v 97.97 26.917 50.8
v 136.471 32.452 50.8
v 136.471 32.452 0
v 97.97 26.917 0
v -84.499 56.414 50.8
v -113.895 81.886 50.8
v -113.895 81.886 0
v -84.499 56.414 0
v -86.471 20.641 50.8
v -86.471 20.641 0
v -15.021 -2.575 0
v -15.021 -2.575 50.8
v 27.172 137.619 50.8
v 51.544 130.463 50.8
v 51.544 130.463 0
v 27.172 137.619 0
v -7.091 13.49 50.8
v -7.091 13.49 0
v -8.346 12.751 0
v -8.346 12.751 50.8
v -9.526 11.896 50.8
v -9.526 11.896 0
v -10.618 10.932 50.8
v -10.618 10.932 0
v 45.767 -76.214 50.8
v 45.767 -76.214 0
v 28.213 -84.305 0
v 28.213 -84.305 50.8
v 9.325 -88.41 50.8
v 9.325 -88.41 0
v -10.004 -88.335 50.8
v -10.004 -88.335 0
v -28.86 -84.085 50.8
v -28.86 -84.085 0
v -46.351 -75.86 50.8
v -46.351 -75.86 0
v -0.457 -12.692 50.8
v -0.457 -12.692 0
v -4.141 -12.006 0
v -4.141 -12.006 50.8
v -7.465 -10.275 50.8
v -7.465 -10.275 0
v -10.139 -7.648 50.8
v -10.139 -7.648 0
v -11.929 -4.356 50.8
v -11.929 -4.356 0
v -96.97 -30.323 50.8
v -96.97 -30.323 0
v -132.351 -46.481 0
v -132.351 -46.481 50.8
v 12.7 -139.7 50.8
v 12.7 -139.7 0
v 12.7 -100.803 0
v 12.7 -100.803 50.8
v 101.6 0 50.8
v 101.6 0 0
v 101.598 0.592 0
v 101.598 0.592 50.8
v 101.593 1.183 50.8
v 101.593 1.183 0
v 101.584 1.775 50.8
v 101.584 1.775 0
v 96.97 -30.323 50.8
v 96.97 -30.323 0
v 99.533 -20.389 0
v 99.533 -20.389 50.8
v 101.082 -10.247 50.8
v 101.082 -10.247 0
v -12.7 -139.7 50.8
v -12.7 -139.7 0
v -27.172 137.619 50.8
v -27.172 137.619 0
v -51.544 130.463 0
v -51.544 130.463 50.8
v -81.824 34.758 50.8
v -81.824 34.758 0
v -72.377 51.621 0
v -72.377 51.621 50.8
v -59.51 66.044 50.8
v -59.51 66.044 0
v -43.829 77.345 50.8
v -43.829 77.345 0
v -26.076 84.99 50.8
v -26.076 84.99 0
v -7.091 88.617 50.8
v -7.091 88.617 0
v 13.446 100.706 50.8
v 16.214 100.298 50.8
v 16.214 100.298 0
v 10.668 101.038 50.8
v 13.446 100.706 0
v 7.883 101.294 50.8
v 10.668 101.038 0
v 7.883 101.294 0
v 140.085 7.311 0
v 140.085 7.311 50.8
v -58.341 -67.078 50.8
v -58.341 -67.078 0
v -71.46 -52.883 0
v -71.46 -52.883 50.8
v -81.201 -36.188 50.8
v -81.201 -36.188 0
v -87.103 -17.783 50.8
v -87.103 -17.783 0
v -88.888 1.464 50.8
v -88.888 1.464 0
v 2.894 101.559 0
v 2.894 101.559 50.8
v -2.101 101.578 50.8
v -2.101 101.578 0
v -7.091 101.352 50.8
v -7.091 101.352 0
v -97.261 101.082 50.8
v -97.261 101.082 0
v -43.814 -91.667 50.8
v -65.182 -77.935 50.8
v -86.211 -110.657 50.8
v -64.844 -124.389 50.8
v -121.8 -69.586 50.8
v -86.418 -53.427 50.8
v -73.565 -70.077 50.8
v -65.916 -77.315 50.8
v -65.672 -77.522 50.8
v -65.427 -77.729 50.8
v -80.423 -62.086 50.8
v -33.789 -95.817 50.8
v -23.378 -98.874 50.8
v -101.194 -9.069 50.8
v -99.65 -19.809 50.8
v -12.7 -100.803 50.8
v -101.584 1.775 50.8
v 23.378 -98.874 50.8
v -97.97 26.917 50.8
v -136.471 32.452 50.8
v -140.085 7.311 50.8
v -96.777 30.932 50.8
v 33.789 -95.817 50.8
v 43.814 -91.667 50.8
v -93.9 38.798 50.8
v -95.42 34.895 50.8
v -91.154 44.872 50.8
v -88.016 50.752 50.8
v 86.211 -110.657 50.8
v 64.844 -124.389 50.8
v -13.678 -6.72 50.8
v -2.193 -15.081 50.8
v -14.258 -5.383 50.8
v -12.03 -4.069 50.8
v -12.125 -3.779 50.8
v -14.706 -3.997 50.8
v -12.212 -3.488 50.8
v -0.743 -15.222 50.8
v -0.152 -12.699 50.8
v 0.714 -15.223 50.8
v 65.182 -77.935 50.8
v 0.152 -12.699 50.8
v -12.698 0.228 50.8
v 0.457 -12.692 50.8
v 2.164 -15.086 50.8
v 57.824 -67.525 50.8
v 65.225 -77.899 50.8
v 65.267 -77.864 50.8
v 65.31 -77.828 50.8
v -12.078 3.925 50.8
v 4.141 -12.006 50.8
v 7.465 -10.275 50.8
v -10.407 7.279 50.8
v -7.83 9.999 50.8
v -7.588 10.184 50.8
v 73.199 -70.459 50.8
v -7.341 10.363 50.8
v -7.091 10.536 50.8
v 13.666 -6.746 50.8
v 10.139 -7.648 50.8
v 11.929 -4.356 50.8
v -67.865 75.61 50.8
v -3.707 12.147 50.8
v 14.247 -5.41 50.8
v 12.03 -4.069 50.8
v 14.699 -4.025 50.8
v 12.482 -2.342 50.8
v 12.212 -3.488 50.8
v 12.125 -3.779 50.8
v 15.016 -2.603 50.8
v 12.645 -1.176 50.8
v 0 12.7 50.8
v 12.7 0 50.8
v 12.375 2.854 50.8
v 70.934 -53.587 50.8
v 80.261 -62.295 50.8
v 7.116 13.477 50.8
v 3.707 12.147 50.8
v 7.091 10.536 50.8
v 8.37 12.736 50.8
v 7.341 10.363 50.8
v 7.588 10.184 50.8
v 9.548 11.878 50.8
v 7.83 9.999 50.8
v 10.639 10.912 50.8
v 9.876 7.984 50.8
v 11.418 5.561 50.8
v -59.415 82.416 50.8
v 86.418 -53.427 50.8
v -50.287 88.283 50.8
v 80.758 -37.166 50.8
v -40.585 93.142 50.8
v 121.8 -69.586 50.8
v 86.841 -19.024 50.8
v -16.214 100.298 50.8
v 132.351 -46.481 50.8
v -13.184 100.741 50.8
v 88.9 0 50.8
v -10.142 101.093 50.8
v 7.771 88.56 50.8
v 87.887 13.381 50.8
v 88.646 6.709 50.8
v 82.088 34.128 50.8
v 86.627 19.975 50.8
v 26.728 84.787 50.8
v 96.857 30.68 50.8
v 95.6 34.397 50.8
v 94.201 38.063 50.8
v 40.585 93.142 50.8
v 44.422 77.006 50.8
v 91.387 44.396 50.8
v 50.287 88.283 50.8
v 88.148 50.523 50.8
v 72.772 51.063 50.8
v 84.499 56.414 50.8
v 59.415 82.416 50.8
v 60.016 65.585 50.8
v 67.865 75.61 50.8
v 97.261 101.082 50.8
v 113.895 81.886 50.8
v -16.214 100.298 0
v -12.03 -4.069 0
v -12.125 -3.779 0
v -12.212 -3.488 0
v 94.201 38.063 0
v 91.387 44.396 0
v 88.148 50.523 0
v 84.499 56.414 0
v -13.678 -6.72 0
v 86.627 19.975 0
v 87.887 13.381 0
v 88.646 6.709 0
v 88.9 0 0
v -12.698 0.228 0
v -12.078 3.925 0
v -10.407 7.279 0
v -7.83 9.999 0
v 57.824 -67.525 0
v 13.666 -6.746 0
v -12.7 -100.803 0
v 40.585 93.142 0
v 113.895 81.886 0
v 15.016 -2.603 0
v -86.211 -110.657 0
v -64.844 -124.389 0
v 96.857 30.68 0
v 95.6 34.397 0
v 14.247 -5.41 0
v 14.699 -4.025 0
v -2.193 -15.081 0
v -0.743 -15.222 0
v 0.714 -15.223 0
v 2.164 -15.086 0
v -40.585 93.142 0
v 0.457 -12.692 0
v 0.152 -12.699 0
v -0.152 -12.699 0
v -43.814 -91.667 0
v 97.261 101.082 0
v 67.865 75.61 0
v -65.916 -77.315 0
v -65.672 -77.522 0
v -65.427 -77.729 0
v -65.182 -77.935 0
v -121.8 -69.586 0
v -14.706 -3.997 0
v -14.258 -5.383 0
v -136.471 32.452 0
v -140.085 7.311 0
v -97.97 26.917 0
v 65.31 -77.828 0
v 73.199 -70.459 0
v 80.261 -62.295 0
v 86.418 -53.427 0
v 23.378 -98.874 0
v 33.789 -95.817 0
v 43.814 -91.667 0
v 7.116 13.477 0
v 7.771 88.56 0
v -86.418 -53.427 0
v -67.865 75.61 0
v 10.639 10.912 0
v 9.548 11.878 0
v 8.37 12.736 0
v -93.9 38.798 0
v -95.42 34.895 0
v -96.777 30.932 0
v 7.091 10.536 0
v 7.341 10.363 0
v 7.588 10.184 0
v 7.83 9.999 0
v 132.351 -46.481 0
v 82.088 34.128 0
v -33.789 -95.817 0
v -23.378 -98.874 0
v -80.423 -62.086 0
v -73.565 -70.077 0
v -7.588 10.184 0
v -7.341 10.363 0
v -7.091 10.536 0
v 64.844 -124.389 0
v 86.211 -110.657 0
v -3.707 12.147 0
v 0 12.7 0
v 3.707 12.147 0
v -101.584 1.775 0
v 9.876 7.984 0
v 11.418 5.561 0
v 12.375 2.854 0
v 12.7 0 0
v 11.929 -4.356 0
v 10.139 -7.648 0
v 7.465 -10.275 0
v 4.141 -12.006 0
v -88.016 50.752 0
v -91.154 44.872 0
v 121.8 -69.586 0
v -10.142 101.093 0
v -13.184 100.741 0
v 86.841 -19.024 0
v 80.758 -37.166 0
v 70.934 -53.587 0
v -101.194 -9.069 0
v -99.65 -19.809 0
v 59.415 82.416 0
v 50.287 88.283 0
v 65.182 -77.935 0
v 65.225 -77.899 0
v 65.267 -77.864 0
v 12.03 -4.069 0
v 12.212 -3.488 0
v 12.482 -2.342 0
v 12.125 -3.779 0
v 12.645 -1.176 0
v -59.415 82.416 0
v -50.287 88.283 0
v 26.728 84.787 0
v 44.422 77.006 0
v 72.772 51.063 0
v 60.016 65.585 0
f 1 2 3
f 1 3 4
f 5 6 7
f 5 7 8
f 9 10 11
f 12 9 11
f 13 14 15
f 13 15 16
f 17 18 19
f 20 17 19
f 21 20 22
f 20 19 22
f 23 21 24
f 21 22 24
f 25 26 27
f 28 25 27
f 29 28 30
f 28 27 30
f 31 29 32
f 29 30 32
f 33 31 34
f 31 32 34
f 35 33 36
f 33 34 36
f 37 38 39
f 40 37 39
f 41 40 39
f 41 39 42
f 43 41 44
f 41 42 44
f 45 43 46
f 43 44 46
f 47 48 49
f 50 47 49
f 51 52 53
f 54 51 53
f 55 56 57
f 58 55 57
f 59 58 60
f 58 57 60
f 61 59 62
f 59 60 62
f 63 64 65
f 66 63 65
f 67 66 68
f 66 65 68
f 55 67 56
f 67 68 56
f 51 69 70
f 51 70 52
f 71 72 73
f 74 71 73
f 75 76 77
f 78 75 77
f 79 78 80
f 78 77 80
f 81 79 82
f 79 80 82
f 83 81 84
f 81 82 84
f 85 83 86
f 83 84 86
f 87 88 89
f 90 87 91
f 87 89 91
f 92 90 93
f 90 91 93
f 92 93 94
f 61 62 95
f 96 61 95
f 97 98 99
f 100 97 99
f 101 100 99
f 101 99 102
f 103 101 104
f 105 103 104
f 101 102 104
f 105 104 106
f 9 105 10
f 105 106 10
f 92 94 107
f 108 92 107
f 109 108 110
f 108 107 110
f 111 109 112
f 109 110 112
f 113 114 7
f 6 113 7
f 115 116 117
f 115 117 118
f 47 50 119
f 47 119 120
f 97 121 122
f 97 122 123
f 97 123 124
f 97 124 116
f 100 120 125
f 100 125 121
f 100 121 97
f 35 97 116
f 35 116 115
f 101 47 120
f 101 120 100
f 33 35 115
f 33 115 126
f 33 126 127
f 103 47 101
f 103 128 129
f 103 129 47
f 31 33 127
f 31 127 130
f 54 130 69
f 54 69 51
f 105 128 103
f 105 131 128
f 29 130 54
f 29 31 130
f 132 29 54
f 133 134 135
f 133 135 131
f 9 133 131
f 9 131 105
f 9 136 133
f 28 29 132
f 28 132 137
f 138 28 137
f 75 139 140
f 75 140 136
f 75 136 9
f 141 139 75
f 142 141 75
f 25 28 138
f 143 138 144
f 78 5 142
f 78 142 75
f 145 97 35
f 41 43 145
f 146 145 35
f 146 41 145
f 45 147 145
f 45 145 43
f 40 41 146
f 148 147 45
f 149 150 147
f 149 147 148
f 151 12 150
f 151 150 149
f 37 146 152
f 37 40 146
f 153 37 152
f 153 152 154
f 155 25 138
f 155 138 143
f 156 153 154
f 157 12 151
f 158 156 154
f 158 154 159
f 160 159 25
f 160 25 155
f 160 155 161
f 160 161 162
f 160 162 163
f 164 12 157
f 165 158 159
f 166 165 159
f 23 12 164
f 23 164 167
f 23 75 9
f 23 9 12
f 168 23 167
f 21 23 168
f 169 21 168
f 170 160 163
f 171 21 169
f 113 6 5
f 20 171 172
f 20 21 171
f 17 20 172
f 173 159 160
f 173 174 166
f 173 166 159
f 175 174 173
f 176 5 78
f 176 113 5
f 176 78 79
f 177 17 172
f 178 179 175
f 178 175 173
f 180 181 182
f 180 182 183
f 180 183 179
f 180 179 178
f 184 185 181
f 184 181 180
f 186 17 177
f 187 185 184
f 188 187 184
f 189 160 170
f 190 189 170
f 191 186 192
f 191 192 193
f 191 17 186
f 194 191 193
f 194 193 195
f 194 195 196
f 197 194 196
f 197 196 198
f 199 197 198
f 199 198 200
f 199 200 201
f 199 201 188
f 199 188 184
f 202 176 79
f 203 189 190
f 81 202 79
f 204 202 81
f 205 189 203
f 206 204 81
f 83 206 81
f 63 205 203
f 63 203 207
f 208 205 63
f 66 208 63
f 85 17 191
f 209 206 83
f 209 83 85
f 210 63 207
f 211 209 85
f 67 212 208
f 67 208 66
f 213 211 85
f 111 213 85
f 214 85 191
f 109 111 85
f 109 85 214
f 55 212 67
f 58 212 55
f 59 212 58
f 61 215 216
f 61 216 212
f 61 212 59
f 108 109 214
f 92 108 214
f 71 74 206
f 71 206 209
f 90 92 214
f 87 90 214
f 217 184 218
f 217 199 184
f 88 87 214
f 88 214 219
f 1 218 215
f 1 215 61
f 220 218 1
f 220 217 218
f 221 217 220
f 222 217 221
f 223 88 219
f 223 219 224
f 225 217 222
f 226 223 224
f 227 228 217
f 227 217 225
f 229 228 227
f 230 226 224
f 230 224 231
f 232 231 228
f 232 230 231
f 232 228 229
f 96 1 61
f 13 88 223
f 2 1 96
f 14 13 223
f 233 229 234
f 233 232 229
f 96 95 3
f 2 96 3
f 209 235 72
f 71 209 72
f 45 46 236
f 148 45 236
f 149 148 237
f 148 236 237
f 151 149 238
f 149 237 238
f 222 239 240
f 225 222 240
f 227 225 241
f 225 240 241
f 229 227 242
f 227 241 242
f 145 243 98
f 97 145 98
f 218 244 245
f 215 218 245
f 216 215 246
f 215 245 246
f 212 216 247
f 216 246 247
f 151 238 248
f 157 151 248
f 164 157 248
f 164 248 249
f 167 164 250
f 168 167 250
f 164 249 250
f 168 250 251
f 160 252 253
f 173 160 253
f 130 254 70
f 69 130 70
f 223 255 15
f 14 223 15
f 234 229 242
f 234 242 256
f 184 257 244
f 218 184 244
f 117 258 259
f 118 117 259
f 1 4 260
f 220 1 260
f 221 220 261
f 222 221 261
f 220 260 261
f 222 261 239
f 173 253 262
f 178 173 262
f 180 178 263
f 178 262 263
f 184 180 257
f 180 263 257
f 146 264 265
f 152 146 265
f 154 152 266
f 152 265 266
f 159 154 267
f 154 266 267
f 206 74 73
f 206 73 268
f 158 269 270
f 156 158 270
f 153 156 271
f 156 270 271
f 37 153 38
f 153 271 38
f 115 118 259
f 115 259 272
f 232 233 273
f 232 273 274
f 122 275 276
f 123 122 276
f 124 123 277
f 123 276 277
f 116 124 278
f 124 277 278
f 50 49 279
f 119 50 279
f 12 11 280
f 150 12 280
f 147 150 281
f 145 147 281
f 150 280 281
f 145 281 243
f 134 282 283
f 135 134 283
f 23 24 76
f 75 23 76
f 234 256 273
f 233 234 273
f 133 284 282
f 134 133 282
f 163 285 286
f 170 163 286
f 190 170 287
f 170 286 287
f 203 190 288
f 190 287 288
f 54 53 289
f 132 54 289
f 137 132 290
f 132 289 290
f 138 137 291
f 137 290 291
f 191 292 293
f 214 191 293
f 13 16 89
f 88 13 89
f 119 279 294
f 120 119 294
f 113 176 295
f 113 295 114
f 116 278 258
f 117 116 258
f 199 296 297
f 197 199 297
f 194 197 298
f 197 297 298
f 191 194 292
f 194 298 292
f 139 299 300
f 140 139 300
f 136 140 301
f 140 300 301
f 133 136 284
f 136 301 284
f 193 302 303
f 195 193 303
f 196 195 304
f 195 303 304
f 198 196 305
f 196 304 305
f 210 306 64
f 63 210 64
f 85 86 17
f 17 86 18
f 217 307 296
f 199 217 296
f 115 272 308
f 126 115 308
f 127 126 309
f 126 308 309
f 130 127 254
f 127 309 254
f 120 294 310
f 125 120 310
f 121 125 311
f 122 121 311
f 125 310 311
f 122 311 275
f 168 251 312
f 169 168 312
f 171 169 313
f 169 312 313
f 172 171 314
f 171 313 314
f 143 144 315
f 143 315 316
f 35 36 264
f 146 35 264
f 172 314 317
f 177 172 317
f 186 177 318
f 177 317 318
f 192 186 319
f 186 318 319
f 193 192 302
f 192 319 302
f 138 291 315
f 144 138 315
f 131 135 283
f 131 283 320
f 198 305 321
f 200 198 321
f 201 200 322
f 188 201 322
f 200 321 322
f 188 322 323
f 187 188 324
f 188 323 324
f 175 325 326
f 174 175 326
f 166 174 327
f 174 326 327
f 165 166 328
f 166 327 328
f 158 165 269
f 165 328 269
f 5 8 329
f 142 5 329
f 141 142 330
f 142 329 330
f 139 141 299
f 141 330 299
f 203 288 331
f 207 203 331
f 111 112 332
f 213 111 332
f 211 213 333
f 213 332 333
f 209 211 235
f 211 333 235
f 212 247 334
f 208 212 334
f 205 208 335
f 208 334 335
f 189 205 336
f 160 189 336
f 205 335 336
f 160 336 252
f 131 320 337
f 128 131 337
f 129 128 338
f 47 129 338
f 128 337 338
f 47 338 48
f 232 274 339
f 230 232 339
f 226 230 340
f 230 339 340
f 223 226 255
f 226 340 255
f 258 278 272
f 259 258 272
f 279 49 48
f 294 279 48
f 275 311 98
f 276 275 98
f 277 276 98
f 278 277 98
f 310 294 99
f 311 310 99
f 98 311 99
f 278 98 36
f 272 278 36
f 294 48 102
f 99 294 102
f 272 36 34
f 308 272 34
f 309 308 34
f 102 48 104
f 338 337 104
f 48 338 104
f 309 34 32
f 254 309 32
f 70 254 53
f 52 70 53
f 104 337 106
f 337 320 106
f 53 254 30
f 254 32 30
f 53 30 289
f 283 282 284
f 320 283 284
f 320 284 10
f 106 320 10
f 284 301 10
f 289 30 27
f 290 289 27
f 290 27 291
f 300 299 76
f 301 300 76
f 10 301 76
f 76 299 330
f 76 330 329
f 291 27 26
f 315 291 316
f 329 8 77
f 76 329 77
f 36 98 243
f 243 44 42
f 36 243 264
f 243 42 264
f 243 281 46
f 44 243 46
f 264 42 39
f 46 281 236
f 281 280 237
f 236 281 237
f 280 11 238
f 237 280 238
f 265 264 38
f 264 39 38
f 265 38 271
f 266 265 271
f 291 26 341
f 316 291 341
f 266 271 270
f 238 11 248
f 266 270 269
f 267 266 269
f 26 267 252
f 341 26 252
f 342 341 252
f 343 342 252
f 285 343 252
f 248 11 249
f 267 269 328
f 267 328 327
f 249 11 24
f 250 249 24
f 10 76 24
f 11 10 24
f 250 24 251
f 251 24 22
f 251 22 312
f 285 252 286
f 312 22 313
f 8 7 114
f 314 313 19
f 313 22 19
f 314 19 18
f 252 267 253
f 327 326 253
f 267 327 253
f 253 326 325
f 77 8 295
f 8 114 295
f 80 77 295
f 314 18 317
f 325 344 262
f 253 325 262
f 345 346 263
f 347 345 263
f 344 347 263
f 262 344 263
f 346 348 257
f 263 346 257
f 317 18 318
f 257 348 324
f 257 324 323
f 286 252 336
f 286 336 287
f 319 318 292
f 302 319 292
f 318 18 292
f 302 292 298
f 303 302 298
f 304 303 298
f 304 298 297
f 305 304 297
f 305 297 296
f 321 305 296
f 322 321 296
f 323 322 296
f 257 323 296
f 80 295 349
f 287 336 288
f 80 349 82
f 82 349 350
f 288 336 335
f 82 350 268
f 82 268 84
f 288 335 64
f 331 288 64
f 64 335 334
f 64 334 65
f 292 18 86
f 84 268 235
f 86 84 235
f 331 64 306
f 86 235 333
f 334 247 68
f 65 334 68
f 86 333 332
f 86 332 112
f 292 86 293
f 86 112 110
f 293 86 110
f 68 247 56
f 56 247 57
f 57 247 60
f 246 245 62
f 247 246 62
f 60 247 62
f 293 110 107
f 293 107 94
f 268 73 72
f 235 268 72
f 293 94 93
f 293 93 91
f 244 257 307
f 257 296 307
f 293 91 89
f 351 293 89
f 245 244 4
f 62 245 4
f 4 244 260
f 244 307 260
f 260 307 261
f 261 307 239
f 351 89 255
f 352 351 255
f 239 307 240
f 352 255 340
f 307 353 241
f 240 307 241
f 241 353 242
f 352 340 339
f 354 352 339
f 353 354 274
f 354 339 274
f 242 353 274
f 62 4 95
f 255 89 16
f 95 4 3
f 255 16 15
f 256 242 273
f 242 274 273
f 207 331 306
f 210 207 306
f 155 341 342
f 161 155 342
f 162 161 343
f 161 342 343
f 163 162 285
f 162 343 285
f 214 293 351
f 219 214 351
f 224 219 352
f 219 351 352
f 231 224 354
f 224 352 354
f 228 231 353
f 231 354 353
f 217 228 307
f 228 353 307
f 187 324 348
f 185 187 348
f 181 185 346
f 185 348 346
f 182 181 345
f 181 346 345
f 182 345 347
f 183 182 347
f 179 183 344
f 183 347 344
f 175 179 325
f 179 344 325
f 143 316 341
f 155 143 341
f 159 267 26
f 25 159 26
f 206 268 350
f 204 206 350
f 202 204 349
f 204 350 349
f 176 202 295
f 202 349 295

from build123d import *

# Parameters (mm, degrees)
F1_DEPTH = 50.8


with BuildPart() as f1:
    # F0 (on Top) → F1 (new body)
    with BuildSketch(Plane.XY):
        with BuildLine():
            ThreePointArc((96.9695183528, -30.3228051214), (100.4357084523, -15.3371597005), (101.6, 0))
            ThreePointArc((101.6, 0), (101.596123159, 0.8875579239), (101.5844929317, 1.775048113))
            ThreePointArc((101.5844929317, 1.775048113), (100.7819473579, 12.8669765974), (98.7719297038, 23.8047453796))
            Line((98.7719297038, 23.8047453796), (86.6267509761, 19.975385236))
            ThreePointArc((86.6267509761, 19.975385236), (88.329859509, 10.0521599228), (88.9, 0))
            ThreePointArc((88.9, 0), (80.758165685, -37.1662303064), (57.8239893096, -67.5247825641))
            Line((57.8239893096, -67.5247825641), (65.3097252428, -77.828014164))
            ThreePointArc((65.3097252428, -77.828014164), (76.8386016033, -66.4709658697), (86.4179770225, -53.4274578034))
            ThreePointArc((86.4179770225, -53.4274578034), (92.418610728, -42.206165321), (96.9695183528, -30.3228051214))
        make_face()
        with BuildLine():
            ThreePointArc((98.7719297038, 23.8047453796), (100.7819473579, 12.8669765974), (101.5844929317, 1.775048113))
            Line((101.5844929317, 1.775048113), (140.0854538768, 7.3106505949))
            Line((140.0854538768, 7.3106505949), (136.4706569847, 32.4521152187))
            Line((136.4706569847, 32.4521152187), (97.9696960396, 26.9165127368))
            ThreePointArc((97.9696960396, 26.9165127368), (98.383116433, 25.3638009955), (98.7719297038, 23.8047453796))
        make_face()
        with BuildLine():
            Line((132.3513604162, -46.4811509754), (96.9695183528, -30.3228051214))
            ThreePointArc((96.9695183528, -30.3228051214), (92.418610728, -42.206165321), (86.4179770225, -53.4274578034))
            Line((86.4179770225, -53.4274578034), (121.7998190859, -69.5858036574))
            Line((121.7998190859, -69.5858036574), (132.3513604162, -46.4811509754))
        make_face()
        with BuildLine():
            Line((86.6267509761, 19.975385236), (98.7719297038, 23.8047453796))
            ThreePointArc((98.7719297038, 23.8047453796), (98.383116433, 25.3638009955), (97.9696960396, 26.9165127368))
            ThreePointArc((97.9696960396, 26.9165127368), (96.2466744343, 32.5443952215), (94.200655019, 38.0630607545))
            Line((94.200655019, 38.0630607545), (82.0884798482, 34.1275764773))
            ThreePointArc((82.0884798482, 34.1275764773), (84.653874142, 27.1464839849), (86.6267509761, 19.975385236))
        make_face()
        with BuildLine():
            ThreePointArc((65.1822037428, -77.9348466042), (65.2459863585, -77.8814564843), (65.3097252428, -77.828014164))
            Line((65.3097252428, -77.828014164), (57.8239893096, -67.5247825641))
            ThreePointArc((57.8239893096, -67.5247825641), (51.9773262379, -72.1218937435), (45.7668585133, -76.2142024942))
            Line((45.7668585133, -76.2142024942), (53.1618630577, -86.5816165028))
            ThreePointArc((53.1618630577, -86.5816165028), (59.3297665101, -82.4775048474), (65.1822037428, -77.9348466042))
        make_face()
        with BuildLine():
            Line((82.0884798482, 34.1275764773), (94.200655019, 38.0630607545))
            ThreePointArc((94.200655019, 38.0630607545), (89.8195388109, 47.4869502894), (84.4986500968, 56.4139887955))
            ThreePointArc((84.4986500968, 56.4139887955), (76.7841567544, 66.5338505688), (67.8651874546, 75.6100279841))
            ThreePointArc((67.8651874546, 75.6100279841), (54.9291070535, 85.4713589356), (40.5850828951, 93.1418866375))
            ThreePointArc((40.5850828951, 93.1418866375), (28.6240277751, 97.4844861192), (16.2139613653, 100.2978935813))
            ThreePointArc((16.2139613653, 100.2978935813), (12.0585389265, 100.8818697237), (7.8825466337, 101.2937582409))
            Line((7.8825466337, 101.2937582409), (7.7714179249, 88.5596695084))
            ThreePointArc((7.7714179249, 88.5596695084), (52.5301198826, 71.7202656515), (82.0884798482, 34.1275764773))
        make_face()
        with BuildLine():
            Line((86.2114420655, -110.6569801548), (65.1822037428, -77.9348466042))
            ThreePointArc((65.1822037428, -77.9348466042), (59.3297665101, -82.4775048474), (53.1618630577, -86.5816165028))
            ThreePointArc((53.1618630577, -86.5816165028), (48.5547397175, -89.2468332825), (43.8143640089, -91.6671233676))
            Line((43.8143640089, -91.6671233676), (64.8436023316, -124.3892569182))
            Line((64.8436023316, -124.3892569182), (86.2114420655, -110.6569801548))
        make_face()
        with BuildLine():
            ThreePointArc((67.8651874546, 75.6100279841), (76.7841567544, 66.5338505688), (84.4986500968, 56.4139887955))
            Line((84.4986500968, 56.4139887955), (113.8949468584, 81.8860249379))
            Line((113.8949468584, 81.8860249379), (97.2614842162, 101.0820641265))
            Line((97.2614842162, 101.0820641265), (67.8651874546, 75.6100279841))
        make_face()
        with BuildLine():
            ThreePointArc((-7.0905186786, 88.6167847807), (0.3416452612, 88.8993435213), (7.7714179249, 88.5596695084))
            Line((7.7714179249, 88.5596695084), (7.8825466337, 101.2937582409))
            ThreePointArc((7.8825466337, 101.2937582409), (0.3970935062, 101.5992239968), (-7.0905186786, 101.3522794261))
            Line((-7.0905186786, 101.3522794261), (-7.0905186786, 88.6167847807))
        make_face()
        with BuildLine():
            ThreePointArc((43.8143640089, -91.6671233676), (48.5547397175, -89.2468332825), (53.1618630577, -86.5816165028))
            Line((53.1618630577, -86.5816165028), (45.7668585133, -76.2142024942))
            ThreePointArc((45.7668585133, -76.2142024942), (-0.3416452612, -88.8993435213), (-46.3512890898, -75.8601871848))
            Line((-46.3512890898, -75.8601871848), (-53.837025023, -86.1634187847))
            ThreePointArc((-53.837025023, -86.1634187847), (-48.9031812462, -89.0563802543), (-43.8143640089, -91.6671233676))
            ThreePointArc((-43.8143640089, -91.6671233676), (-28.6240277751, -97.4844861192), (-12.7, -100.8031249516))
            ThreePointArc((-12.7, -100.8031249516), (0, -101.6), (12.7, -100.8031249516))
            ThreePointArc((12.7, -100.8031249516), (28.6240277751, -97.4844861192), (43.8143640089, -91.6671233676))
        make_face()
        with BuildLine():
            ThreePointArc((-81.8237505577, 34.7575005526), (-51.9773262379, 72.1218937435), (-7.0905186786, 88.6167847807))
            Line((-7.0905186786, 88.6167847807), (-7.0905186786, 101.3522794261))
            ThreePointArc((-7.0905186786, 101.3522794261), (-11.66416006, 100.9282288069), (-16.2139613653, 100.2978935813))
            ThreePointArc((-16.2139613653, 100.2978935813), (-28.6240277751, 97.4844861192), (-40.5850828951, 93.1418866375))
            ThreePointArc((-40.5850828951, 93.1418866375), (-54.9291070535, 85.4713589356), (-67.8651874546, 75.6100279841))
            ThreePointArc((-67.8651874546, 75.6100279841), (-76.7841567544, 66.5338505688), (-84.4986500968, 56.4139887955))
            ThreePointArc((-84.4986500968, 56.4139887955), (-89.6332547574, 47.8376383364), (-93.9002479663, 38.7982400615))
            Line((-93.9002479663, 38.7982400615), (-81.8237505577, 34.7575005526))
        make_face()
        with BuildLine():
            Line((-53.837025023, -86.1634187847), (-46.3512890898, -75.8601871848))
            ThreePointArc((-46.3512890898, -75.8601871848), (-52.5301198826, -71.7202656515), (-58.3412768566, -67.0783528029))
            Line((-58.3412768566, -67.0783528029), (-65.9160914289, -77.3151271792))
            ThreePointArc((-65.9160914289, -77.3151271792), (-65.5498799562, -77.6258541835), (-65.1822037428, -77.9348466042))
            ThreePointArc((-65.1822037428, -77.9348466042), (-59.6516684933, -82.2449904004), (-53.837025023, -86.1634187847))
        make_face()
        with BuildLine():
            ThreePointArc((16.2139613653, 100.2978935813), (28.6240277751, 97.4844861192), (40.5850828951, 93.1418866375))
            Line((40.5850828951, 93.1418866375), (51.5435989557, 130.4631649421))
            Line((51.5435989557, 130.4631649421), (27.1724774258, 137.6191718858))
            Line((27.1724774258, 137.6191718858), (16.2139613653, 100.2978935813))
        make_face()
        with BuildLine():
            ThreePointArc((-86.4706613894, 20.6406084909), (-84.4427257585, 27.7963318888), (-81.8237505577, 34.7575005526))
            Line((-81.8237505577, 34.7575005526), (-93.9002479663, 38.7982400615))
            ThreePointArc((-93.9002479663, 38.7982400615), (-96.1187427834, 32.9203172181), (-97.9696960396, 26.9165127368))
            ThreePointArc((-97.9696960396, 26.9165127368), (-98.2832331034, 25.7481279076), (-98.5828365602, 24.5760927681))
            Line((-98.5828365602, 24.5760927681), (-86.4706613894, 20.6406084909))
        make_face()
        with BuildLine():
            Line((12.7, -139.7), (12.7, -100.8031249516))
            ThreePointArc((12.7, -100.8031249516), (0, -101.6), (-12.7, -100.8031249516))
            Line((-12.7, -100.8031249516), (-12.7, -139.7))
            Line((-12.7, -139.7), (12.7, -139.7))
        make_face()
        with BuildLine():
            ThreePointArc((-43.8143640089, -91.6671233676), (-48.9031812462, -89.0563802543), (-53.837025023, -86.1634187847))
            ThreePointArc((-53.837025023, -86.1634187847), (-59.6516684933, -82.2449904004), (-65.1822037428, -77.9348466042))
            Line((-65.1822037428, -77.9348466042), (-86.2114420655, -110.6569801548))
            Line((-86.2114420655, -110.6569801548), (-64.8436023316, -124.3892569182))
            Line((-64.8436023316, -124.3892569182), (-43.8143640089, -91.6671233676))
        make_face()
        with BuildLine():
            Line((-65.9160914289, -77.3151271792), (-58.3412768566, -67.0783528029))
            ThreePointArc((-58.3412768566, -67.0783528029), (-84.653874142, -27.1464839849), (-86.4706613894, 20.6406084909))
            Line((-86.4706613894, 20.6406084909), (-98.5828365602, 24.5760927681))
            ThreePointArc((-98.5828365602, 24.5760927681), (-100.7308883031, 13.2607745505), (-101.5844929317, 1.775048113))
            ThreePointArc((-101.5844929317, 1.775048113), (-100.5658584951, -14.4591875686), (-96.9695183528, -30.3228051214))
            ThreePointArc((-96.9695183528, -30.3228051214), (-92.418610728, -42.206165321), (-86.4179770225, -53.4274578034))
            ThreePointArc((-86.4179770225, -53.4274578034), (-77.0978098897, -66.1701421353), (-65.9160914289, -77.3151271792))
        make_face()
        with BuildLine():
            ThreePointArc((-40.5850828951, 93.1418866375), (-28.6240277751, 97.4844861192), (-16.2139613653, 100.2978935813))
            Line((-16.2139613653, 100.2978935813), (-27.1724774258, 137.6191718858))
            Line((-27.1724774258, 137.6191718858), (-51.5435989557, 130.4631649421))
            Line((-51.5435989557, 130.4631649421), (-40.5850828951, 93.1418866375))
        make_face()
        with BuildLine():
            Line((-113.8949468584, 81.8860249379), (-84.4986500968, 56.4139887955))
            ThreePointArc((-84.4986500968, 56.4139887955), (-76.7841567544, 66.5338505688), (-67.8651874546, 75.6100279841))
            Line((-67.8651874546, 75.6100279841), (-97.2614842162, 101.0820641265))
            Line((-97.2614842162, 101.0820641265), (-113.8949468584, 81.8860249379))
        make_face()
        with BuildLine():
            ThreePointArc((-98.5828365602, 24.5760927681), (-98.2832331034, 25.7481279076), (-97.9696960396, 26.9165127368))
            Line((-97.9696960396, 26.9165127368), (-136.4706569847, 32.4521152187))
            Line((-136.4706569847, 32.4521152187), (-140.0854538768, 7.3106505949))
            Line((-140.0854538768, 7.3106505949), (-101.5844929317, 1.775048113))
            ThreePointArc((-101.5844929317, 1.775048113), (-100.7308883031, 13.2607745505), (-98.5828365602, 24.5760927681))
        make_face()
        with BuildLine():
            Line((-121.7998190859, -69.5858036574), (-86.4179770225, -53.4274578034))
            ThreePointArc((-86.4179770225, -53.4274578034), (-92.418610728, -42.206165321), (-96.9695183528, -30.3228051214))
            Line((-96.9695183528, -30.3228051214), (-132.3513604162, -46.4811509754))
            Line((-132.3513604162, -46.4811509754), (-121.7998190859, -69.5858036574))
        make_face()
        with BuildLine():
            Line((-7.8295678477, 9.9993933475), (-10.6179485696, 10.932372486))
            ThreePointArc((-10.6179485696, 10.932372486), (-14.4896137183, 4.7232080512), (-15.0209152577, -2.5748213181))
            Line((-15.0209152577, -2.5748213181), (-12.2117493889, -3.4875746388))
            ThreePointArc((-12.2117493889, -3.4875746388), (-12.0784177569, 3.9245158286), (-7.8295678477, 9.9993933475))
        make_face()
        with BuildLine():
            Line((7.0905186786, 10.5363439992), (7.116177538, 13.4765580638))
            ThreePointArc((7.116177538, 13.4765580638), (0.0145009141, 15.2399931012), (-7.0905186786, 13.4900757918))
            Line((-7.0905186786, 13.4900757918), (-7.0905186786, 10.5363439992))
            ThreePointArc((-7.0905186786, 10.5363439992), (0, 12.7), (7.0905186786, 10.5363439992))
        make_face()
        with BuildLine():
            ThreePointArc((2.1642135184, -15.0855487088), (8.946111704, -12.3379368364), (13.6656177126, -6.7459982606))
            Line((13.6656177126, -6.7459982606), (11.9294577257, -4.3563790435))
            ThreePointArc((11.9294577257, -4.3563790435), (7.4648727041, -10.2745158286), (0.4567575059, -12.6917836643))
            Line((0.4567575059, -12.6917836643), (2.1642135184, -15.0855487088))
        make_face()
        with BuildLine():
            ThreePointArc((-13.6784306448, -6.7199802898), (-8.9695746758, -12.3208899896), (-2.1929174928, -15.0814028814))
            Line((-2.1929174928, -15.0814028814), (-0.4567575059, -12.6917836643))
            ThreePointArc((-0.4567575059, -12.6917836643), (-7.4648727041, -10.2745158286), (-11.9294577257, -4.3563790435))
            Line((-11.9294577257, -4.3563790435), (-13.6784306448, -6.7199802898))
        make_face()
        with BuildLine():
            Line((12.2117493889, -3.4875746388), (15.0159881581, -2.6034015512))
            ThreePointArc((15.0159881581, -2.6034015512), (15.1838937616, -1.3065107101), (15.24, 0))
            ThreePointArc((15.24, 0), (14.0426475751, 5.921287789), (10.6387337165, 10.9121466682))
            Line((10.6387337165, 10.9121466682), (7.8295678477, 9.9993933475))
            ThreePointArc((7.8295678477, 9.9993933475), (11.4176510646, 5.5612268581), (12.7, 0))
            ThreePointArc((12.7, 0), (12.5773450545, -1.7607928272), (12.2117493889, -3.4875746388))
        make_face()
        with BuildLine():
            ThreePointArc((-58.3412768566, -67.0783528029), (-52.5301198826, -71.7202656515), (-46.3512890898, -75.8601871848))
            Line((-46.3512890898, -75.8601871848), (-2.1929174928, -15.0814028814))
            ThreePointArc((-2.1929174928, -15.0814028814), (-8.9695746758, -12.3208899896), (-13.6784306448, -6.7199802898))
            Line((-13.6784306448, -6.7199802898), (-58.3412768566, -67.0783528029))
        make_face()
        with BuildLine():
            ThreePointArc((45.7668585133, -76.2142024942), (51.9773262379, -72.1218937435), (57.8239893096, -67.5247825641))
            Line((57.8239893096, -67.5247825641), (13.6656177126, -6.7459982606))
            ThreePointArc((13.6656177126, -6.7459982606), (8.946111704, -12.3379368364), (2.1642135184, -15.0855487088))
            Line((2.1642135184, -15.0855487088), (45.7668585133, -76.2142024942))
        make_face()
        with BuildLine():
            Line((-10.6179485696, 10.932372486), (-81.8237505577, 34.7575005526))
            ThreePointArc((-81.8237505577, 34.7575005526), (-84.4427257585, 27.7963318888), (-86.4706613894, 20.6406084909))
            Line((-86.4706613894, 20.6406084909), (-15.0209152577, -2.5748213181))
            ThreePointArc((-15.0209152577, -2.5748213181), (-14.4896137183, 4.7232080512), (-10.6179485696, 10.932372486))
        make_face()
        with BuildLine():
            ThreePointArc((-15.0209152577, -2.5748213181), (-14.498575776, -4.6956256736), (-13.6784306448, -6.7199802898))
            Line((-13.6784306448, -6.7199802898), (-11.9294577257, -4.3563790435))
            ThreePointArc((-11.9294577257, -4.3563790435), (-12.0784177569, -3.9245158286), (-12.2117493889, -3.4875746388))
            Line((-12.2117493889, -3.4875746388), (-15.0209152577, -2.5748213181))
        make_face()
        with BuildLine():
            Line((-7.0905186786, 10.5363439992), (-7.0905186786, 13.4900757918))
            ThreePointArc((-7.0905186786, 13.4900757918), (-8.946111704, 12.3379368364), (-10.6179485696, 10.932372486))
            Line((-10.6179485696, 10.932372486), (-7.8295678477, 9.9993933475))
            ThreePointArc((-7.8295678477, 9.9993933475), (-7.4648727041, 10.2745158286), (-7.0905186786, 10.5363439992))
        make_face()
        with BuildLine():
            Line((7.8295678477, 9.9993933475), (10.6387337165, 10.9121466682))
            ThreePointArc((10.6387337165, 10.9121466682), (8.9695746758, 12.3208899896), (7.116177538, 13.4765580638))
            Line((7.116177538, 13.4765580638), (7.0905186786, 10.5363439992))
            ThreePointArc((7.0905186786, 10.5363439992), (7.4648727041, 10.2745158286), (7.8295678477, 9.9993933475))
        make_face()
        with BuildLine():
            Line((15.0159881581, -2.6034015512), (86.6267509761, 19.975385236))
            ThreePointArc((86.6267509761, 19.975385236), (84.653874142, 27.1464839849), (82.0884798482, 34.1275764773))
            Line((82.0884798482, 34.1275764773), (10.6387337165, 10.9121466682))
            ThreePointArc((10.6387337165, 10.9121466682), (14.0426475751, 5.921287789), (15.24, 0))
            ThreePointArc((15.24, 0), (15.1838937616, -1.3065107101), (15.0159881581, -2.6034015512))
        make_face()
        with BuildLine():
            Line((7.116177538, 13.4765580638), (7.7714179249, 88.5596695084))
            ThreePointArc((7.7714179249, 88.5596695084), (0.3416452612, 88.8993435213), (-7.0905186786, 88.6167847807))
            Line((-7.0905186786, 88.6167847807), (-7.0905186786, 13.4900757918))
            ThreePointArc((-7.0905186786, 13.4900757918), (0.0145009141, 15.2399931012), (7.116177538, 13.4765580638))
        make_face()
        with BuildLine():
            ThreePointArc((-2.1929174928, -15.0814028814), (-0.0145009141, -15.2399931012), (2.1642135184, -15.0855487088))
            Line((2.1642135184, -15.0855487088), (0.4567575059, -12.6917836643))
            ThreePointArc((0.4567575059, -12.6917836643), (0, -12.7), (-0.4567575059, -12.6917836643))
            Line((-0.4567575059, -12.6917836643), (-2.1929174928, -15.0814028814))
        make_face()
        with BuildLine():
            ThreePointArc((13.6656177126, -6.7459982606), (14.4896137183, -4.7232080512), (15.0159881581, -2.6034015512))
            Line((15.0159881581, -2.6034015512), (12.2117493889, -3.4875746388))
            ThreePointArc((12.2117493889, -3.4875746388), (12.0784177569, -3.9245158286), (11.9294577257, -4.3563790435))
            Line((11.9294577257, -4.3563790435), (13.6656177126, -6.7459982606))
        make_face()
    extrude(amount=F1_DEPTH)


solid = f1.part
